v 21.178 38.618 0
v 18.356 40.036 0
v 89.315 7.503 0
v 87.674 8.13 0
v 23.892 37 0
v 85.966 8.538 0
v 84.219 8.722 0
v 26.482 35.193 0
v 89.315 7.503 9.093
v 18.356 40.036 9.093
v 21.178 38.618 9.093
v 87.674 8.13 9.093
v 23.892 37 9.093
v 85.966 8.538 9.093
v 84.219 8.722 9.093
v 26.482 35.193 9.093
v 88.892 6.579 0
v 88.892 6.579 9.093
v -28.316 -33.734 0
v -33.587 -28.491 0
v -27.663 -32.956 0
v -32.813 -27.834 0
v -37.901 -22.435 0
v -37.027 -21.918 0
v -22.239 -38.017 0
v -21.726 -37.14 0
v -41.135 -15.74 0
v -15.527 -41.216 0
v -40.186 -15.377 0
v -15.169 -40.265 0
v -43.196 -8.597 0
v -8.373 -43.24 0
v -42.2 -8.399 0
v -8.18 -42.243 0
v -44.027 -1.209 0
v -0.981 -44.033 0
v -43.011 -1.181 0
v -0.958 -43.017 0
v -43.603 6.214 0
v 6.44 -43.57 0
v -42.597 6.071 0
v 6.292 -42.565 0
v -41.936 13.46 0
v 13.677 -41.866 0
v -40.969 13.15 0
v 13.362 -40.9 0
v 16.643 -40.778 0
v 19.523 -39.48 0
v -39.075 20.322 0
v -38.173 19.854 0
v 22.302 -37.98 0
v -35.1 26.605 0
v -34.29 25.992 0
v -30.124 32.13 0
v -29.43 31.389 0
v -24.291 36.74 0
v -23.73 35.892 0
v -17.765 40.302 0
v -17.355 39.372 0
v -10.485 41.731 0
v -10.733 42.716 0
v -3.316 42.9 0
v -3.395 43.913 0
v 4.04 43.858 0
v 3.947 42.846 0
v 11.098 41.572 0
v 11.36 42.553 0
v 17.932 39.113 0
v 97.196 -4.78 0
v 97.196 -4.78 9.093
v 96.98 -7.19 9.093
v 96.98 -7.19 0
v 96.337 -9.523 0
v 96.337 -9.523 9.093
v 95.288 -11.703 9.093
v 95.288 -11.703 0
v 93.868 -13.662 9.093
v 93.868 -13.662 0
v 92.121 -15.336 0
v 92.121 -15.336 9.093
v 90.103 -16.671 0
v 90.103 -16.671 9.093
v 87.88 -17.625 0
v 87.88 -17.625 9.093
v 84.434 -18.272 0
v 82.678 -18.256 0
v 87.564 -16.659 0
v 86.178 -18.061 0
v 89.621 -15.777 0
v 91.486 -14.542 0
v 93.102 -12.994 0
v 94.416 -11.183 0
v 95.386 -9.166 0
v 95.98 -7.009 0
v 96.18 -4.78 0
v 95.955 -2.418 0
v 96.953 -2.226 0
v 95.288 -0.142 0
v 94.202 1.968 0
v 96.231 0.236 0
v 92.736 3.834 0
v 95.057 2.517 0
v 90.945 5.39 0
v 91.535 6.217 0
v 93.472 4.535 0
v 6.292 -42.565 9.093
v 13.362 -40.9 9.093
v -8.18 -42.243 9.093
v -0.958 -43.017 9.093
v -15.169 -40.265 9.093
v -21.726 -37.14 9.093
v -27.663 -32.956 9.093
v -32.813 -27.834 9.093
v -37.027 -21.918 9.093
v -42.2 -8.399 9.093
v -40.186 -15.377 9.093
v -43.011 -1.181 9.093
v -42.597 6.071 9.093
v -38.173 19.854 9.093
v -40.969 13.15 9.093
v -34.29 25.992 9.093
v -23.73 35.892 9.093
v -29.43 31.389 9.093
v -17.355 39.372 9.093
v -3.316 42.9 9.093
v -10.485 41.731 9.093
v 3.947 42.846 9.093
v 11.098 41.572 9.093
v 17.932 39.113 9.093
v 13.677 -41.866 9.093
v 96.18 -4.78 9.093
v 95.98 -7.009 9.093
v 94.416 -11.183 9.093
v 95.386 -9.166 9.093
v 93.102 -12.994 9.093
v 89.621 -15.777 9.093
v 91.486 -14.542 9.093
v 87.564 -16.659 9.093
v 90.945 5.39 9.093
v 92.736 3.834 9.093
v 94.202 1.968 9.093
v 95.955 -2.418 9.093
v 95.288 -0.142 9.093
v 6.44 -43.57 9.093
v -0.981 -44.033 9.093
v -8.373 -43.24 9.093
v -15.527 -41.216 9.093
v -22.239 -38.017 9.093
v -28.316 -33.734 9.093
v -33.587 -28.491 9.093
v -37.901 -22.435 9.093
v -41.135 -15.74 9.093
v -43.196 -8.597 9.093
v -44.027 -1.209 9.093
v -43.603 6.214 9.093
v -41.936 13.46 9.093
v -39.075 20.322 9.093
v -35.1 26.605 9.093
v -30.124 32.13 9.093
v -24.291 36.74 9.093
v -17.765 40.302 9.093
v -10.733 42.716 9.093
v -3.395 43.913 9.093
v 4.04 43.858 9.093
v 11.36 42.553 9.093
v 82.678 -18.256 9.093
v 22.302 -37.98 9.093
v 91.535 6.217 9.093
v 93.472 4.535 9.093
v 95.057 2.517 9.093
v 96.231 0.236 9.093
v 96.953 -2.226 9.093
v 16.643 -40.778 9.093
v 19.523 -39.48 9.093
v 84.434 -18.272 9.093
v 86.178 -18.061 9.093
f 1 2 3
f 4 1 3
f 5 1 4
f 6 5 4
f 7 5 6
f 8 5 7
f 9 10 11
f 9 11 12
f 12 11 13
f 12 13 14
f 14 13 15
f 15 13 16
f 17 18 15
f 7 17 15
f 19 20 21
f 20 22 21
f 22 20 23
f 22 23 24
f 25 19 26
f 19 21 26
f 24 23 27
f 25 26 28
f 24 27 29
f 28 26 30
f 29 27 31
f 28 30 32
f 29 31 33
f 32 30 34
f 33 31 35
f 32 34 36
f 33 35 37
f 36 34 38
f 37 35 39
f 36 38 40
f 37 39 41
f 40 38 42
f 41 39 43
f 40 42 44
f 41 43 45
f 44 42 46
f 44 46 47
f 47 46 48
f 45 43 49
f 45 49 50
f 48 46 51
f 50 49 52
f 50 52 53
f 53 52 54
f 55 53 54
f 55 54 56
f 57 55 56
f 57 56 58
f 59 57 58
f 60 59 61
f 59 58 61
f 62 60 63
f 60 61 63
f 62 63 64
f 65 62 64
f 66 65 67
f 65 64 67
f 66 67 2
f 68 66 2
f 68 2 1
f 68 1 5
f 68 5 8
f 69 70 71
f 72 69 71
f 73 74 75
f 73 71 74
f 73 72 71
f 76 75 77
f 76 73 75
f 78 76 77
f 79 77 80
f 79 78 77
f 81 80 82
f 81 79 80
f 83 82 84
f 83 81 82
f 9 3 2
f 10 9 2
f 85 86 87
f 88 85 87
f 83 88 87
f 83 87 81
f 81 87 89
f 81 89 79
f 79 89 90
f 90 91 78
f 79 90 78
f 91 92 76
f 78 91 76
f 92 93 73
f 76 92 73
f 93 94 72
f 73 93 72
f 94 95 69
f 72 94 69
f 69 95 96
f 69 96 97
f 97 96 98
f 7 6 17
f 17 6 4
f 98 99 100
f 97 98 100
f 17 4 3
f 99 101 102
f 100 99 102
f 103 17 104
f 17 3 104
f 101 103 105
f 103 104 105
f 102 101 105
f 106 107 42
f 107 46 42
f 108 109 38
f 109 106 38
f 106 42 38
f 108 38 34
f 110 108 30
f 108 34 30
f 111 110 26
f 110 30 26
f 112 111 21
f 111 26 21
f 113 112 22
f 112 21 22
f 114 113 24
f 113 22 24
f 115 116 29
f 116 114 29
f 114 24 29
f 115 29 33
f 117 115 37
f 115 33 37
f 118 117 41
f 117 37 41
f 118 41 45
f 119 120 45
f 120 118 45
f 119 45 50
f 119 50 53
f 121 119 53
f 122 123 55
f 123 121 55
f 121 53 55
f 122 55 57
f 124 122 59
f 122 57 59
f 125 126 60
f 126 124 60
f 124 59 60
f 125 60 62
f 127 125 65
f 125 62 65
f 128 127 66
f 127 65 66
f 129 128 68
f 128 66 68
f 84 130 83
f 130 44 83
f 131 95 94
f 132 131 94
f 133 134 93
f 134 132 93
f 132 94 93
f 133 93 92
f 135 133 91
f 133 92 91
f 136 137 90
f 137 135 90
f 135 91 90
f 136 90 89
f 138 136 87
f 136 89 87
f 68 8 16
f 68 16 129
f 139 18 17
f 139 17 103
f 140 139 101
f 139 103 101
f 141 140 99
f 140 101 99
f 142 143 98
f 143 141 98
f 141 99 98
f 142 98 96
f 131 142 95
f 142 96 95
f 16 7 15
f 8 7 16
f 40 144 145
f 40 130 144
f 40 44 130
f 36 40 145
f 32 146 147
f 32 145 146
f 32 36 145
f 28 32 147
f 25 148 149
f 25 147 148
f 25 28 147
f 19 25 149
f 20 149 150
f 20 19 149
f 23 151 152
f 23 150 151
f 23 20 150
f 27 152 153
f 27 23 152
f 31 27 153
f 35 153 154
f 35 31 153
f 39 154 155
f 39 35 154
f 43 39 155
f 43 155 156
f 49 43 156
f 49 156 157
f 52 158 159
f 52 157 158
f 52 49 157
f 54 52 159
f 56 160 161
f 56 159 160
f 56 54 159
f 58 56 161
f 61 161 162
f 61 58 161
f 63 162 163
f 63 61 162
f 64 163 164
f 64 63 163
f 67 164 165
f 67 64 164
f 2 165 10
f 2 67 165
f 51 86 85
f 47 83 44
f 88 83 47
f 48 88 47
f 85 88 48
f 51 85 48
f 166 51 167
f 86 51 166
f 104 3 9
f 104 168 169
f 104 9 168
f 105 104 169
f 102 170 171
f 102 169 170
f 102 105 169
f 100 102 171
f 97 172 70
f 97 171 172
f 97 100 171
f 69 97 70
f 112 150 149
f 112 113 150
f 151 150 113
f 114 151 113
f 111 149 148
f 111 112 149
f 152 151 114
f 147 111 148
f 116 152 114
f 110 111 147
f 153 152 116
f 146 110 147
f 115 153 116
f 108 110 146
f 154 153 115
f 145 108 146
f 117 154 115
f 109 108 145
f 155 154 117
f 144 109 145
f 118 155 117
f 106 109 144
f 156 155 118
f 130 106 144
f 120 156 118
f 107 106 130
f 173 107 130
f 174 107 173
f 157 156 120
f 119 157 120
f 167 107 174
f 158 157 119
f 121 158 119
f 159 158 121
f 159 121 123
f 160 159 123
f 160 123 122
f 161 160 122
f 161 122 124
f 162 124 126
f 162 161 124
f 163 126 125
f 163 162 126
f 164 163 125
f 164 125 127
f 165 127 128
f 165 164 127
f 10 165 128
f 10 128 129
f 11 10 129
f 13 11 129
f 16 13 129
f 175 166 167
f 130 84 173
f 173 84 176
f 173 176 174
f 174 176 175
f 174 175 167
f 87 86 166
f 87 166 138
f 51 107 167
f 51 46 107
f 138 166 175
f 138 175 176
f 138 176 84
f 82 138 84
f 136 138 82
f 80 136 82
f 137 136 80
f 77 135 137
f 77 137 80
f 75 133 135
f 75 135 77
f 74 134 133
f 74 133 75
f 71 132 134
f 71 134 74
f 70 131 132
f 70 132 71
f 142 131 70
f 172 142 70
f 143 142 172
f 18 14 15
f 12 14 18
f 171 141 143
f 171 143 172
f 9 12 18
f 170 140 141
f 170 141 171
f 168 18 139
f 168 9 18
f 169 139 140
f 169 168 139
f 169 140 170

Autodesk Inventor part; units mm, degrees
ref_plane "YZ Plane" through (0, 0, 0) normal (1, 0, 0) x (0, 1, 0)
ref_plane "XZ Plane" through (0, 0, 0) normal (0, 1, 0) x (-1, 0, 0)
ref_plane "XY Plane" through (0, 0, 0) normal (0, 0, 1) x (1, 0, 0)
sketch "Sketch1" plane through (0, 0, 0) normal (0, 0, 1) x (1, 0, 0)
  circle A0 centre (0, 0) radius 43.0276
  circle A1 centre (83.6836, -4.7804) radius 12.4968
  circle A2 centre (0, 0) radius 44.0436
  circle A3 centre (83.6836, -4.7804) radius 13.5128
  line L0 (13.6771, -41.8662) -> (87.8798, -17.6251)
  line L1 (13.3616, -40.9004) -> (87.5643, -16.6593)
  line L2 (88.8918, 6.5794) -> (17.9323, 39.1127)
  line L3 (89.3152, 7.503) -> (18.3557, 40.0363)
  point P0 (17.6469, -33.9959)
  point P1 (17.4567, 34.094)
  dimension "d0" = 86.0552
  dimension "d1" = 24.9936
  dimension "d2" = 83.82
  dimension "d3" = 88.0872
  dimension "d4" = 27.0256
  dimension "d5" = 1.016
  dimension "d6" = 1.016
extrude "Extrusion1" add sketch "Sketch1" along normal blind 9.0932 contours A0 L1 A2 L2 | A2 L3 A3 L2 | L1 A3 L0 A2 | A3 L1 A1 L2 picked at (-23.5196, -36.5948) picked at (90.0516, 6.6643)
properties part number "Diff Motor Belts"
